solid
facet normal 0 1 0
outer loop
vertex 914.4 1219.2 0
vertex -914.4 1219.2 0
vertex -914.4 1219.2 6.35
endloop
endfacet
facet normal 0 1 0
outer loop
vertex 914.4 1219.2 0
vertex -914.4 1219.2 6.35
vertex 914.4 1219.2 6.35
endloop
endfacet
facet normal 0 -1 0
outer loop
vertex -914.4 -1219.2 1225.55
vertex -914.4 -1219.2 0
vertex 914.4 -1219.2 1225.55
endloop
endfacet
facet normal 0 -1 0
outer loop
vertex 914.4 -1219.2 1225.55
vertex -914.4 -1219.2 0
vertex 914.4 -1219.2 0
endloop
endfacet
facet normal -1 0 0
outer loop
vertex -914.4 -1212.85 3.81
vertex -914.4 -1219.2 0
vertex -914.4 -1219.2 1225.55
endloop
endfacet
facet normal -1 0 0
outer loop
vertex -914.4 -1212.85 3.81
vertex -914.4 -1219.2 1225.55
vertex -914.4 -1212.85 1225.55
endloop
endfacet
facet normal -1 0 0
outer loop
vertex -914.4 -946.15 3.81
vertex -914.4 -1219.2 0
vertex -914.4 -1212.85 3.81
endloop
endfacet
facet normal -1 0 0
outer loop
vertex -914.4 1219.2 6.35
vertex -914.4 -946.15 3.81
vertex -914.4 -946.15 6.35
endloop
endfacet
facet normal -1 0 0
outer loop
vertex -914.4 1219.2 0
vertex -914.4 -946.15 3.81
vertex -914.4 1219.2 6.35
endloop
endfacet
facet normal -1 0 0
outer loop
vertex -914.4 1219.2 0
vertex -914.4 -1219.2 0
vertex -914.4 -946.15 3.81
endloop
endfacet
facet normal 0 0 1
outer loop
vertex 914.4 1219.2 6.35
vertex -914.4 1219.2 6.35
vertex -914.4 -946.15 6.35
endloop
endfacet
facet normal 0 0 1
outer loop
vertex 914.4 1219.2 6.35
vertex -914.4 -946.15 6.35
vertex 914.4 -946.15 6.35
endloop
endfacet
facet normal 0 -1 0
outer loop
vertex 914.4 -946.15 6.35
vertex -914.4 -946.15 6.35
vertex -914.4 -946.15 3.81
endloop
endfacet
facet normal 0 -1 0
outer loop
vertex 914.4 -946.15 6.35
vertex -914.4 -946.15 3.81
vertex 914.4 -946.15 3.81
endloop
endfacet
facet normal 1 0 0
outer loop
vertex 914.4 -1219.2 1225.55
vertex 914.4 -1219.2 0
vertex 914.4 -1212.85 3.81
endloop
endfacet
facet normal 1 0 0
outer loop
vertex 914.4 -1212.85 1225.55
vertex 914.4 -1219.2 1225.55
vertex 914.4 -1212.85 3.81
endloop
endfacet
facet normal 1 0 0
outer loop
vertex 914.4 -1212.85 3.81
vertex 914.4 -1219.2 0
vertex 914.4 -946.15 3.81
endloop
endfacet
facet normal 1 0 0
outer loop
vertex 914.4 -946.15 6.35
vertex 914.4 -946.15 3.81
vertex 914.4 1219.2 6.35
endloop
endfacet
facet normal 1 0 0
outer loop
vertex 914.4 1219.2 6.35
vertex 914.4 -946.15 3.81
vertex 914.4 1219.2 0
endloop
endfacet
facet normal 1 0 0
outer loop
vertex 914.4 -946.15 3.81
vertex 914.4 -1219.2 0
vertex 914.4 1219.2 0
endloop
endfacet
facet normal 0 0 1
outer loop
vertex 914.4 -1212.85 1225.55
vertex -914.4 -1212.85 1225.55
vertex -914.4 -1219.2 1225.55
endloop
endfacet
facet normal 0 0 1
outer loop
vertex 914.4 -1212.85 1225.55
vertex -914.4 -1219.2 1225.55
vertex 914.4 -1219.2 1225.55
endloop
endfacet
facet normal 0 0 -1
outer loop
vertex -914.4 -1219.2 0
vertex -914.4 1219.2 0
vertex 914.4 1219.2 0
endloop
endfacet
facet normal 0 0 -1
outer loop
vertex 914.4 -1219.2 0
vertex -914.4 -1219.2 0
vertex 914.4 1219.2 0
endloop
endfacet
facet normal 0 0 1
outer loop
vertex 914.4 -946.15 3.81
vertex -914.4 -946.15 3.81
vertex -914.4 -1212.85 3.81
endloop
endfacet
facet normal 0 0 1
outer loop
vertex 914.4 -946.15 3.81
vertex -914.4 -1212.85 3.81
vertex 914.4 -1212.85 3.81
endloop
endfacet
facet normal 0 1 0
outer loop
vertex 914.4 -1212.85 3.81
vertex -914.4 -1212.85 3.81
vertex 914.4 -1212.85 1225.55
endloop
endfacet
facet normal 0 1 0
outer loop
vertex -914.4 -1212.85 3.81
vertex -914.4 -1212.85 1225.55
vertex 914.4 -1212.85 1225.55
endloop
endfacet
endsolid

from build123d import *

# Parameters (mm, degrees)
SKETCH1_W           = 1828.8
SKETCH1_H           = 2438.4
BOSS_EXTRUDE1_DEPTH = 6.35
SKETCH2_W           = 1828.8
SKETCH2_H           = 6.35
BOSS_EXTRUDE2_DEPTH = 1219.2
SKETCH3_W           = 1828.8
SKETCH3_H           = 266.7
CUT_EXTRUDE1_DEPTH  = 2.54


with BuildPart() as part:
    # Sketch1 → Boss-Extrude1 (new body)
    with BuildSketch(Plane.XY):
        Rectangle(SKETCH1_W, SKETCH1_H)
    extrude(amount=BOSS_EXTRUDE1_DEPTH)

    # Sketch2 → Boss-Extrude2 (add)
    with BuildSketch(Plane.XY.offset(6.35)):
        with Locations((0, -1216.025)):
            Rectangle(SKETCH2_W, SKETCH2_H)
    extrude(amount=BOSS_EXTRUDE2_DEPTH)

    # Sketch3 → Cut-Extrude1 (cut)
    with BuildSketch(Plane.XY.offset(6.35)):
        with Locations((0, -1079.5)):
            Rectangle(SKETCH3_W, SKETCH3_H)
    extrude(amount=-CUT_EXTRUDE1_DEPTH, mode=Mode.SUBTRACT)


solid = part.part
